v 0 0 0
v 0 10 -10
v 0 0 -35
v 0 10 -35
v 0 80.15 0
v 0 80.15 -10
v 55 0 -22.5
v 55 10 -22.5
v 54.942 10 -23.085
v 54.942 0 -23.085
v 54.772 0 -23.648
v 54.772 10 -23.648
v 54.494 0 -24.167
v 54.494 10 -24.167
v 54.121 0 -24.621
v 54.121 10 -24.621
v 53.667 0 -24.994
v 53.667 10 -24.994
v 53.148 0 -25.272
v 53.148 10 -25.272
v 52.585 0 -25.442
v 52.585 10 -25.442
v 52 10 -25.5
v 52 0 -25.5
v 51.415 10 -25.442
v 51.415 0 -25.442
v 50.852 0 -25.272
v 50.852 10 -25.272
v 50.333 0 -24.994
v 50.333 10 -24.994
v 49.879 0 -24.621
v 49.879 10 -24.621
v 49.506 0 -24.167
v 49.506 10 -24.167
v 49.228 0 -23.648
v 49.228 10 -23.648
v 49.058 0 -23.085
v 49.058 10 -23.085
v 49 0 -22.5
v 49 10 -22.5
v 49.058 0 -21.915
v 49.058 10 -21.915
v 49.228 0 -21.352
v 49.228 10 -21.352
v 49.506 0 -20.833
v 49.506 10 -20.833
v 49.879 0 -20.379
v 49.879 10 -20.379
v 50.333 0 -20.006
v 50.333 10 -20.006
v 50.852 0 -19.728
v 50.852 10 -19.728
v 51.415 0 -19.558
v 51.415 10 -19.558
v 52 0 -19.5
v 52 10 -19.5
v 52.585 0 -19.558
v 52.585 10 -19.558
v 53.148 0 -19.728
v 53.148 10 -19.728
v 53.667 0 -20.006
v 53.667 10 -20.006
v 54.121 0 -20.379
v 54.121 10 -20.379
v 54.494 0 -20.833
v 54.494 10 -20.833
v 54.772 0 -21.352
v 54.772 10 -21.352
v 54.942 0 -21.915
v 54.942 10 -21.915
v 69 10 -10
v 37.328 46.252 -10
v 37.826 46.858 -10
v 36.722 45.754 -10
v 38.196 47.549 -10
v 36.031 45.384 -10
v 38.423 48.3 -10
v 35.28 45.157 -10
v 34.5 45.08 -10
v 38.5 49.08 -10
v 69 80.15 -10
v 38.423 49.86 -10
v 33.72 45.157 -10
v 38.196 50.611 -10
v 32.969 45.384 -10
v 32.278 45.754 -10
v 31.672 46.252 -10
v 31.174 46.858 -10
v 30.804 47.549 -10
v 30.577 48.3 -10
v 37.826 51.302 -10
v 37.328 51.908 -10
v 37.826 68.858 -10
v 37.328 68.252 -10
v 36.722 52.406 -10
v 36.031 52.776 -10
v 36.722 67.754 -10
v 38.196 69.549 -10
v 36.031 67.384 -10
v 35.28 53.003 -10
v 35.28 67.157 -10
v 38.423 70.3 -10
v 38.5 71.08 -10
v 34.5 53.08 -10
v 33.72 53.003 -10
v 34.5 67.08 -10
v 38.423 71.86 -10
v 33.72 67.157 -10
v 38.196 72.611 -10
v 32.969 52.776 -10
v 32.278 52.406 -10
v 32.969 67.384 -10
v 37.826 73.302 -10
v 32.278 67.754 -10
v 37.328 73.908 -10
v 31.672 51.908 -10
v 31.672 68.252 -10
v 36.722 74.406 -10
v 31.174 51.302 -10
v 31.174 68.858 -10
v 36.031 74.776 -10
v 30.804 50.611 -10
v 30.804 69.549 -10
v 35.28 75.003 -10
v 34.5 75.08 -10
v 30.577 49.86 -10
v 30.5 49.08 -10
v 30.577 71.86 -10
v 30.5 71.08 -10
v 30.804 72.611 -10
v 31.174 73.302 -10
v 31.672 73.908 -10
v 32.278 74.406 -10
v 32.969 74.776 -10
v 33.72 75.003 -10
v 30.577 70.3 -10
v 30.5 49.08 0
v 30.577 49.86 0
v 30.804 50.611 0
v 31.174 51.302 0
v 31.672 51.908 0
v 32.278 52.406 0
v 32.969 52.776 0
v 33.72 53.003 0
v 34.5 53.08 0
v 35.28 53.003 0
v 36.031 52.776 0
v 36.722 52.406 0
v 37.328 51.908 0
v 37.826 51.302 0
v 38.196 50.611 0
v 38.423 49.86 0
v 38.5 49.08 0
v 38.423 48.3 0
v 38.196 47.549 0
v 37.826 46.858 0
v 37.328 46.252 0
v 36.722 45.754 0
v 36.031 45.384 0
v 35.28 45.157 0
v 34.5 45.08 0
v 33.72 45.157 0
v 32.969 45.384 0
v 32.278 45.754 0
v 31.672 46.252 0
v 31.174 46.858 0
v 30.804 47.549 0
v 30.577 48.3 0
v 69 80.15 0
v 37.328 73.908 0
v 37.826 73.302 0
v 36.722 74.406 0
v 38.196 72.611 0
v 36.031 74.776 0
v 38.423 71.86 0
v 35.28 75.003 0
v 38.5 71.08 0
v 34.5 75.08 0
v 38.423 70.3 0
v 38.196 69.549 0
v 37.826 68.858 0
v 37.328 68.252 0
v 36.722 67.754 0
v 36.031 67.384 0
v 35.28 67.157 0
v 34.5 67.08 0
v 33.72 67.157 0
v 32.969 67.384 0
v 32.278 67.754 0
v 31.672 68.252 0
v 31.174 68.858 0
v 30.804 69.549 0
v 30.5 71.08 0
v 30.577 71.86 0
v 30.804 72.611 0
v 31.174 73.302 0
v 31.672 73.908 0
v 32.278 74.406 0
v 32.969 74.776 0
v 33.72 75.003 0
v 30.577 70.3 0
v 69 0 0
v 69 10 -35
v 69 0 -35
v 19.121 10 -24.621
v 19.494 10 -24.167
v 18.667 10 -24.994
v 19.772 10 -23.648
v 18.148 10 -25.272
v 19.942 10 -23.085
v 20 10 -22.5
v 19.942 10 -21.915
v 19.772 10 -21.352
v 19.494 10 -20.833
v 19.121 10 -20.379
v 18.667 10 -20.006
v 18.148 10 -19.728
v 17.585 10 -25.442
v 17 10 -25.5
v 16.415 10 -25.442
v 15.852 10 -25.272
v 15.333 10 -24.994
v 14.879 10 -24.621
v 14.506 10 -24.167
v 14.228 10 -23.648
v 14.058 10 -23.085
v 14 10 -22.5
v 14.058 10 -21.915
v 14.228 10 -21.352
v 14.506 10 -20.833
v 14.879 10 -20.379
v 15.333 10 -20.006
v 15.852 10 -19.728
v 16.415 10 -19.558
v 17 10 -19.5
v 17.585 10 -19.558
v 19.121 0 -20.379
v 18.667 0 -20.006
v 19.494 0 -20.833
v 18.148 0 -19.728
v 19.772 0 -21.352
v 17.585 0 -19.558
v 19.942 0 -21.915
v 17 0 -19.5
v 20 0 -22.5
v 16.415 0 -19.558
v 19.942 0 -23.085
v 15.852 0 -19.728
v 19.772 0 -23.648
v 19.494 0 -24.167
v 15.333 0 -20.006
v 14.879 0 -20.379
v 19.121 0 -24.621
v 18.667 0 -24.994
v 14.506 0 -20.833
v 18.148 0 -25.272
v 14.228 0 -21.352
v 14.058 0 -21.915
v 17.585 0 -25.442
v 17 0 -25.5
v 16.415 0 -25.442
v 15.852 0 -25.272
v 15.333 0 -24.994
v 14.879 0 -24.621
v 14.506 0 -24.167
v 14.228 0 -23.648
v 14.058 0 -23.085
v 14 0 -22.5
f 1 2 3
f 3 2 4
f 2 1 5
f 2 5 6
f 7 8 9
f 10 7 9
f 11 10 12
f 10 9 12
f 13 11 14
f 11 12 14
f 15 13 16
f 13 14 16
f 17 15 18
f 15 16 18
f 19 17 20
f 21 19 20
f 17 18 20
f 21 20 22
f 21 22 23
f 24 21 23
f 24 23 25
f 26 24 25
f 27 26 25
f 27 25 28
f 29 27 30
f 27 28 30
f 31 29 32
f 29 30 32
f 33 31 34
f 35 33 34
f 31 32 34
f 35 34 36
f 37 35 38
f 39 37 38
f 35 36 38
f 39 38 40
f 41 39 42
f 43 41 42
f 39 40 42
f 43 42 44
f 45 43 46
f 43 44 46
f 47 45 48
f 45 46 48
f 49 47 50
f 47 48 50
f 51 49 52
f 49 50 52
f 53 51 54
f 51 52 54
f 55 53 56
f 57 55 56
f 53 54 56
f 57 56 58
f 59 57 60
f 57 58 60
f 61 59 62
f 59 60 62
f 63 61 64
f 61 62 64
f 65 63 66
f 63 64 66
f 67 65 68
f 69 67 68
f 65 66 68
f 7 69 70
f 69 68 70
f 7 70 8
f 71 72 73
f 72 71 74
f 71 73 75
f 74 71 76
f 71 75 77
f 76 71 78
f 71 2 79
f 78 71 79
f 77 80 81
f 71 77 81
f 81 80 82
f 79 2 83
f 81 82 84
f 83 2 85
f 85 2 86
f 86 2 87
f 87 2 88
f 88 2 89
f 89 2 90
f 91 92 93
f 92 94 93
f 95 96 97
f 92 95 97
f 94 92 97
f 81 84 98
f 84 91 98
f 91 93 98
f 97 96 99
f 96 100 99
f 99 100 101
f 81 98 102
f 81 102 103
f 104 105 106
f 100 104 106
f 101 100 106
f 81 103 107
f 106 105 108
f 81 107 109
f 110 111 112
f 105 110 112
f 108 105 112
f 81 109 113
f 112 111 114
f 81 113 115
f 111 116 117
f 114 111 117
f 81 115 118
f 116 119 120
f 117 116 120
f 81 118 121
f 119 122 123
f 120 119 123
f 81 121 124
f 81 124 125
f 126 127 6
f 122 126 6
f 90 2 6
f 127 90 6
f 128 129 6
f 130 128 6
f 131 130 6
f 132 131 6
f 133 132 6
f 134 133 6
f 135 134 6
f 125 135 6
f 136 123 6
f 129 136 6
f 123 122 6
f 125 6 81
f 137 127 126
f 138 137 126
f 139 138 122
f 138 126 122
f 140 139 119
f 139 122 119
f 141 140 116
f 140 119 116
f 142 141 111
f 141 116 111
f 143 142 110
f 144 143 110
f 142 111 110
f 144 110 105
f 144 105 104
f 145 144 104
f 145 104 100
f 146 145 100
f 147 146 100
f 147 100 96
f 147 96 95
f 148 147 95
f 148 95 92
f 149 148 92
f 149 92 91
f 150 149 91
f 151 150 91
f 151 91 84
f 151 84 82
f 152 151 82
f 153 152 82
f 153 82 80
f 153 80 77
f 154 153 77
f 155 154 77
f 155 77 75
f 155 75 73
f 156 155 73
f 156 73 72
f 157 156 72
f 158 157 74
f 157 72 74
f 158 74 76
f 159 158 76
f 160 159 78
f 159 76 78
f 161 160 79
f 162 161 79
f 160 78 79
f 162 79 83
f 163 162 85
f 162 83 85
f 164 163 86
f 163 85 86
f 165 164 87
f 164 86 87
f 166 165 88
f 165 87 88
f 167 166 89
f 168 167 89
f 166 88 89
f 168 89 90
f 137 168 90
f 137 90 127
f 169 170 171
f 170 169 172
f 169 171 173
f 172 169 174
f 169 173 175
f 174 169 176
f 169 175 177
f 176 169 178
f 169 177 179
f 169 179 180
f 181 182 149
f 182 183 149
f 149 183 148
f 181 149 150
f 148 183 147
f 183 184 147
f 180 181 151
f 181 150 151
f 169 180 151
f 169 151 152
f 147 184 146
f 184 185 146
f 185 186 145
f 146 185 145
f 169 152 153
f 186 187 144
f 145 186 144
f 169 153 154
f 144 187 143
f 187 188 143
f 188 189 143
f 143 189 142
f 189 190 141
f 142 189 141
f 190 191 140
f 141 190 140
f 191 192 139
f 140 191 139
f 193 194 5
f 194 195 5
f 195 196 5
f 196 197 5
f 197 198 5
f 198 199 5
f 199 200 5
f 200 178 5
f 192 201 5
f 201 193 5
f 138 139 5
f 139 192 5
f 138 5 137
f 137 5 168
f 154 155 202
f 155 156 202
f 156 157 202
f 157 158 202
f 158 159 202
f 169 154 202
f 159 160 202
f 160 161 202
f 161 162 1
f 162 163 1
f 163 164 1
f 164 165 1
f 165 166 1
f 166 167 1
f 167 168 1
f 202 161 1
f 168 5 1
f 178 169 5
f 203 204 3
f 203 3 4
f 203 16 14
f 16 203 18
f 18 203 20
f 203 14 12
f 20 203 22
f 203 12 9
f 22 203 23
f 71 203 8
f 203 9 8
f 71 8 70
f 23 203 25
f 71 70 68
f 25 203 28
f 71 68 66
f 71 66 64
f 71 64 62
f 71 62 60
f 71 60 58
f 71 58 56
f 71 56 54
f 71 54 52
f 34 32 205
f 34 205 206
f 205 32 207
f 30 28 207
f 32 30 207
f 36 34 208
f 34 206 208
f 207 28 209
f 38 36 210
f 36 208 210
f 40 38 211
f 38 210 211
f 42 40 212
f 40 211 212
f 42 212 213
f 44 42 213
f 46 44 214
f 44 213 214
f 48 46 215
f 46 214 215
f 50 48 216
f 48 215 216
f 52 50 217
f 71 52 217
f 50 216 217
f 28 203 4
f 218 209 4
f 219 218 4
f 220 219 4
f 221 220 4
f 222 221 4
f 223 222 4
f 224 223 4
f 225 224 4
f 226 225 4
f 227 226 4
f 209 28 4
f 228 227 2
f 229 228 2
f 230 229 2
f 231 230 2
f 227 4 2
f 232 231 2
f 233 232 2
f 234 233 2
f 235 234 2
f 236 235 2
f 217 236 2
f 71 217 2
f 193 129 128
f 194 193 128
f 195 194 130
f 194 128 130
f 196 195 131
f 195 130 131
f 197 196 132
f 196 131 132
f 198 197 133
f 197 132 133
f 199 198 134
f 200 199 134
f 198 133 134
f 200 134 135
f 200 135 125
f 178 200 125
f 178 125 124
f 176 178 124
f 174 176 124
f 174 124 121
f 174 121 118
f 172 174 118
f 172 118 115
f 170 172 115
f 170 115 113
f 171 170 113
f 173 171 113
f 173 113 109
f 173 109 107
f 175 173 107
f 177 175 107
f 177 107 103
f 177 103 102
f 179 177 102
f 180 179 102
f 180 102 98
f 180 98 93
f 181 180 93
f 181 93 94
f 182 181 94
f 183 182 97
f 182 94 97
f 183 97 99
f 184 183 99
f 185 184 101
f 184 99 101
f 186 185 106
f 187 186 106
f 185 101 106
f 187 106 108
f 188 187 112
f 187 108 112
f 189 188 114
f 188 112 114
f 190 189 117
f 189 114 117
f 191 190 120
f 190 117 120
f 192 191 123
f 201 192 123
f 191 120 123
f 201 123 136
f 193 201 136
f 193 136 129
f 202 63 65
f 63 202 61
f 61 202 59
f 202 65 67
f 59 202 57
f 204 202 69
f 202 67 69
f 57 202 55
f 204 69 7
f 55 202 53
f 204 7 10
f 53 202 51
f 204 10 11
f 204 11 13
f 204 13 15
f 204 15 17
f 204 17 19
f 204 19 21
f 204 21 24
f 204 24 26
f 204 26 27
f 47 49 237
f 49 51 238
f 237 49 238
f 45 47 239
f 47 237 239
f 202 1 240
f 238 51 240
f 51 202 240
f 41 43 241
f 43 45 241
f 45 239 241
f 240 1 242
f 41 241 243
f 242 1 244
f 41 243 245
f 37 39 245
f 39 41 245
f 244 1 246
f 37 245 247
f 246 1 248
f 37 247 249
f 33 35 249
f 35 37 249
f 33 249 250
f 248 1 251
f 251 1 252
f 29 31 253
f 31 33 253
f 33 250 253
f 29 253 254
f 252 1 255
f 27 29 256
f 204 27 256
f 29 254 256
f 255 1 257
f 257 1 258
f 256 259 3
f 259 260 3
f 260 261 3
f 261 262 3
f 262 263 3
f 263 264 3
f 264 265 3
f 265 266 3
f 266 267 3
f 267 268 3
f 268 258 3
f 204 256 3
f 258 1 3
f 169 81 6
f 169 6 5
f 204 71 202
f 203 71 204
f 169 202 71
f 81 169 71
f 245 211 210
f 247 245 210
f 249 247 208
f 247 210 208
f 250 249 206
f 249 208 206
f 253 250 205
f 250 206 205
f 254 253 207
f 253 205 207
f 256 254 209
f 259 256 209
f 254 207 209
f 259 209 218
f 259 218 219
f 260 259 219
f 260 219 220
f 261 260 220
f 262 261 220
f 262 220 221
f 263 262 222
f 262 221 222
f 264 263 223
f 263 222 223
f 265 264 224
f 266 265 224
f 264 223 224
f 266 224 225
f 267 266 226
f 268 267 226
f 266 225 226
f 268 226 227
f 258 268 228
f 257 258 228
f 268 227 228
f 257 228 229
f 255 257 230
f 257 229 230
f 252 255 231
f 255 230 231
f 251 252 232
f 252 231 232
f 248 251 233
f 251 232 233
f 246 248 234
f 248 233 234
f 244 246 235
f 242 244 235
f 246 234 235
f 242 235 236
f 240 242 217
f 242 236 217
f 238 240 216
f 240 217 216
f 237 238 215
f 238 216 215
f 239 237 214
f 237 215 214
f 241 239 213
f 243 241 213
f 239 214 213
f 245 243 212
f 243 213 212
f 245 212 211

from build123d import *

# Parameters (mm, degrees)
BOSS_EXTRUDE1_DEPTH = 69
SKETCH2_R           = 4
CUT_EXTRUDE1_DEPTH  = 11
SKETCH3_R           = 3
CUT_EXTRUDE2_DEPTH  = 10


with BuildPart() as part:
    # Sketch1 → Boss-Extrude1 (new body)
    with BuildSketch(Plane(origin=(0, 0, 0), x_dir=(0, 0, -1), z_dir=(1, 0, 0))):
        Polygon((0, 80.15), (0, 0), (35, 0), (35, 10), (10, 10), (10, 80.15), align=None)
    extrude(amount=BOSS_EXTRUDE1_DEPTH)

    # Sketch2 → Cut-Extrude1 (cut, through all)
    with BuildSketch(Plane(origin=(0, 0, -10), x_dir=(-1, 0, 0), z_dir=(0, 0, -1))):
        with Locations((-34.5, 71.08)):
            Circle(SKETCH2_R)
        with Locations((-34.5, 49.08)):
            Circle(SKETCH2_R)
    extrude(amount=-CUT_EXTRUDE1_DEPTH, mode=Mode.SUBTRACT)

    # Sketch3 → Cut-Extrude2 (cut)
    with BuildSketch(Plane(origin=(0, 10, 0), x_dir=(1, 0, 0), z_dir=(0, 1, 0))):
        with Locations((17, 22.5)):
            Circle(SKETCH3_R)
        with Locations((52, 22.5)):
            Circle(SKETCH3_R)
    extrude(amount=-CUT_EXTRUDE2_DEPTH, mode=Mode.SUBTRACT)


solid = part.part
